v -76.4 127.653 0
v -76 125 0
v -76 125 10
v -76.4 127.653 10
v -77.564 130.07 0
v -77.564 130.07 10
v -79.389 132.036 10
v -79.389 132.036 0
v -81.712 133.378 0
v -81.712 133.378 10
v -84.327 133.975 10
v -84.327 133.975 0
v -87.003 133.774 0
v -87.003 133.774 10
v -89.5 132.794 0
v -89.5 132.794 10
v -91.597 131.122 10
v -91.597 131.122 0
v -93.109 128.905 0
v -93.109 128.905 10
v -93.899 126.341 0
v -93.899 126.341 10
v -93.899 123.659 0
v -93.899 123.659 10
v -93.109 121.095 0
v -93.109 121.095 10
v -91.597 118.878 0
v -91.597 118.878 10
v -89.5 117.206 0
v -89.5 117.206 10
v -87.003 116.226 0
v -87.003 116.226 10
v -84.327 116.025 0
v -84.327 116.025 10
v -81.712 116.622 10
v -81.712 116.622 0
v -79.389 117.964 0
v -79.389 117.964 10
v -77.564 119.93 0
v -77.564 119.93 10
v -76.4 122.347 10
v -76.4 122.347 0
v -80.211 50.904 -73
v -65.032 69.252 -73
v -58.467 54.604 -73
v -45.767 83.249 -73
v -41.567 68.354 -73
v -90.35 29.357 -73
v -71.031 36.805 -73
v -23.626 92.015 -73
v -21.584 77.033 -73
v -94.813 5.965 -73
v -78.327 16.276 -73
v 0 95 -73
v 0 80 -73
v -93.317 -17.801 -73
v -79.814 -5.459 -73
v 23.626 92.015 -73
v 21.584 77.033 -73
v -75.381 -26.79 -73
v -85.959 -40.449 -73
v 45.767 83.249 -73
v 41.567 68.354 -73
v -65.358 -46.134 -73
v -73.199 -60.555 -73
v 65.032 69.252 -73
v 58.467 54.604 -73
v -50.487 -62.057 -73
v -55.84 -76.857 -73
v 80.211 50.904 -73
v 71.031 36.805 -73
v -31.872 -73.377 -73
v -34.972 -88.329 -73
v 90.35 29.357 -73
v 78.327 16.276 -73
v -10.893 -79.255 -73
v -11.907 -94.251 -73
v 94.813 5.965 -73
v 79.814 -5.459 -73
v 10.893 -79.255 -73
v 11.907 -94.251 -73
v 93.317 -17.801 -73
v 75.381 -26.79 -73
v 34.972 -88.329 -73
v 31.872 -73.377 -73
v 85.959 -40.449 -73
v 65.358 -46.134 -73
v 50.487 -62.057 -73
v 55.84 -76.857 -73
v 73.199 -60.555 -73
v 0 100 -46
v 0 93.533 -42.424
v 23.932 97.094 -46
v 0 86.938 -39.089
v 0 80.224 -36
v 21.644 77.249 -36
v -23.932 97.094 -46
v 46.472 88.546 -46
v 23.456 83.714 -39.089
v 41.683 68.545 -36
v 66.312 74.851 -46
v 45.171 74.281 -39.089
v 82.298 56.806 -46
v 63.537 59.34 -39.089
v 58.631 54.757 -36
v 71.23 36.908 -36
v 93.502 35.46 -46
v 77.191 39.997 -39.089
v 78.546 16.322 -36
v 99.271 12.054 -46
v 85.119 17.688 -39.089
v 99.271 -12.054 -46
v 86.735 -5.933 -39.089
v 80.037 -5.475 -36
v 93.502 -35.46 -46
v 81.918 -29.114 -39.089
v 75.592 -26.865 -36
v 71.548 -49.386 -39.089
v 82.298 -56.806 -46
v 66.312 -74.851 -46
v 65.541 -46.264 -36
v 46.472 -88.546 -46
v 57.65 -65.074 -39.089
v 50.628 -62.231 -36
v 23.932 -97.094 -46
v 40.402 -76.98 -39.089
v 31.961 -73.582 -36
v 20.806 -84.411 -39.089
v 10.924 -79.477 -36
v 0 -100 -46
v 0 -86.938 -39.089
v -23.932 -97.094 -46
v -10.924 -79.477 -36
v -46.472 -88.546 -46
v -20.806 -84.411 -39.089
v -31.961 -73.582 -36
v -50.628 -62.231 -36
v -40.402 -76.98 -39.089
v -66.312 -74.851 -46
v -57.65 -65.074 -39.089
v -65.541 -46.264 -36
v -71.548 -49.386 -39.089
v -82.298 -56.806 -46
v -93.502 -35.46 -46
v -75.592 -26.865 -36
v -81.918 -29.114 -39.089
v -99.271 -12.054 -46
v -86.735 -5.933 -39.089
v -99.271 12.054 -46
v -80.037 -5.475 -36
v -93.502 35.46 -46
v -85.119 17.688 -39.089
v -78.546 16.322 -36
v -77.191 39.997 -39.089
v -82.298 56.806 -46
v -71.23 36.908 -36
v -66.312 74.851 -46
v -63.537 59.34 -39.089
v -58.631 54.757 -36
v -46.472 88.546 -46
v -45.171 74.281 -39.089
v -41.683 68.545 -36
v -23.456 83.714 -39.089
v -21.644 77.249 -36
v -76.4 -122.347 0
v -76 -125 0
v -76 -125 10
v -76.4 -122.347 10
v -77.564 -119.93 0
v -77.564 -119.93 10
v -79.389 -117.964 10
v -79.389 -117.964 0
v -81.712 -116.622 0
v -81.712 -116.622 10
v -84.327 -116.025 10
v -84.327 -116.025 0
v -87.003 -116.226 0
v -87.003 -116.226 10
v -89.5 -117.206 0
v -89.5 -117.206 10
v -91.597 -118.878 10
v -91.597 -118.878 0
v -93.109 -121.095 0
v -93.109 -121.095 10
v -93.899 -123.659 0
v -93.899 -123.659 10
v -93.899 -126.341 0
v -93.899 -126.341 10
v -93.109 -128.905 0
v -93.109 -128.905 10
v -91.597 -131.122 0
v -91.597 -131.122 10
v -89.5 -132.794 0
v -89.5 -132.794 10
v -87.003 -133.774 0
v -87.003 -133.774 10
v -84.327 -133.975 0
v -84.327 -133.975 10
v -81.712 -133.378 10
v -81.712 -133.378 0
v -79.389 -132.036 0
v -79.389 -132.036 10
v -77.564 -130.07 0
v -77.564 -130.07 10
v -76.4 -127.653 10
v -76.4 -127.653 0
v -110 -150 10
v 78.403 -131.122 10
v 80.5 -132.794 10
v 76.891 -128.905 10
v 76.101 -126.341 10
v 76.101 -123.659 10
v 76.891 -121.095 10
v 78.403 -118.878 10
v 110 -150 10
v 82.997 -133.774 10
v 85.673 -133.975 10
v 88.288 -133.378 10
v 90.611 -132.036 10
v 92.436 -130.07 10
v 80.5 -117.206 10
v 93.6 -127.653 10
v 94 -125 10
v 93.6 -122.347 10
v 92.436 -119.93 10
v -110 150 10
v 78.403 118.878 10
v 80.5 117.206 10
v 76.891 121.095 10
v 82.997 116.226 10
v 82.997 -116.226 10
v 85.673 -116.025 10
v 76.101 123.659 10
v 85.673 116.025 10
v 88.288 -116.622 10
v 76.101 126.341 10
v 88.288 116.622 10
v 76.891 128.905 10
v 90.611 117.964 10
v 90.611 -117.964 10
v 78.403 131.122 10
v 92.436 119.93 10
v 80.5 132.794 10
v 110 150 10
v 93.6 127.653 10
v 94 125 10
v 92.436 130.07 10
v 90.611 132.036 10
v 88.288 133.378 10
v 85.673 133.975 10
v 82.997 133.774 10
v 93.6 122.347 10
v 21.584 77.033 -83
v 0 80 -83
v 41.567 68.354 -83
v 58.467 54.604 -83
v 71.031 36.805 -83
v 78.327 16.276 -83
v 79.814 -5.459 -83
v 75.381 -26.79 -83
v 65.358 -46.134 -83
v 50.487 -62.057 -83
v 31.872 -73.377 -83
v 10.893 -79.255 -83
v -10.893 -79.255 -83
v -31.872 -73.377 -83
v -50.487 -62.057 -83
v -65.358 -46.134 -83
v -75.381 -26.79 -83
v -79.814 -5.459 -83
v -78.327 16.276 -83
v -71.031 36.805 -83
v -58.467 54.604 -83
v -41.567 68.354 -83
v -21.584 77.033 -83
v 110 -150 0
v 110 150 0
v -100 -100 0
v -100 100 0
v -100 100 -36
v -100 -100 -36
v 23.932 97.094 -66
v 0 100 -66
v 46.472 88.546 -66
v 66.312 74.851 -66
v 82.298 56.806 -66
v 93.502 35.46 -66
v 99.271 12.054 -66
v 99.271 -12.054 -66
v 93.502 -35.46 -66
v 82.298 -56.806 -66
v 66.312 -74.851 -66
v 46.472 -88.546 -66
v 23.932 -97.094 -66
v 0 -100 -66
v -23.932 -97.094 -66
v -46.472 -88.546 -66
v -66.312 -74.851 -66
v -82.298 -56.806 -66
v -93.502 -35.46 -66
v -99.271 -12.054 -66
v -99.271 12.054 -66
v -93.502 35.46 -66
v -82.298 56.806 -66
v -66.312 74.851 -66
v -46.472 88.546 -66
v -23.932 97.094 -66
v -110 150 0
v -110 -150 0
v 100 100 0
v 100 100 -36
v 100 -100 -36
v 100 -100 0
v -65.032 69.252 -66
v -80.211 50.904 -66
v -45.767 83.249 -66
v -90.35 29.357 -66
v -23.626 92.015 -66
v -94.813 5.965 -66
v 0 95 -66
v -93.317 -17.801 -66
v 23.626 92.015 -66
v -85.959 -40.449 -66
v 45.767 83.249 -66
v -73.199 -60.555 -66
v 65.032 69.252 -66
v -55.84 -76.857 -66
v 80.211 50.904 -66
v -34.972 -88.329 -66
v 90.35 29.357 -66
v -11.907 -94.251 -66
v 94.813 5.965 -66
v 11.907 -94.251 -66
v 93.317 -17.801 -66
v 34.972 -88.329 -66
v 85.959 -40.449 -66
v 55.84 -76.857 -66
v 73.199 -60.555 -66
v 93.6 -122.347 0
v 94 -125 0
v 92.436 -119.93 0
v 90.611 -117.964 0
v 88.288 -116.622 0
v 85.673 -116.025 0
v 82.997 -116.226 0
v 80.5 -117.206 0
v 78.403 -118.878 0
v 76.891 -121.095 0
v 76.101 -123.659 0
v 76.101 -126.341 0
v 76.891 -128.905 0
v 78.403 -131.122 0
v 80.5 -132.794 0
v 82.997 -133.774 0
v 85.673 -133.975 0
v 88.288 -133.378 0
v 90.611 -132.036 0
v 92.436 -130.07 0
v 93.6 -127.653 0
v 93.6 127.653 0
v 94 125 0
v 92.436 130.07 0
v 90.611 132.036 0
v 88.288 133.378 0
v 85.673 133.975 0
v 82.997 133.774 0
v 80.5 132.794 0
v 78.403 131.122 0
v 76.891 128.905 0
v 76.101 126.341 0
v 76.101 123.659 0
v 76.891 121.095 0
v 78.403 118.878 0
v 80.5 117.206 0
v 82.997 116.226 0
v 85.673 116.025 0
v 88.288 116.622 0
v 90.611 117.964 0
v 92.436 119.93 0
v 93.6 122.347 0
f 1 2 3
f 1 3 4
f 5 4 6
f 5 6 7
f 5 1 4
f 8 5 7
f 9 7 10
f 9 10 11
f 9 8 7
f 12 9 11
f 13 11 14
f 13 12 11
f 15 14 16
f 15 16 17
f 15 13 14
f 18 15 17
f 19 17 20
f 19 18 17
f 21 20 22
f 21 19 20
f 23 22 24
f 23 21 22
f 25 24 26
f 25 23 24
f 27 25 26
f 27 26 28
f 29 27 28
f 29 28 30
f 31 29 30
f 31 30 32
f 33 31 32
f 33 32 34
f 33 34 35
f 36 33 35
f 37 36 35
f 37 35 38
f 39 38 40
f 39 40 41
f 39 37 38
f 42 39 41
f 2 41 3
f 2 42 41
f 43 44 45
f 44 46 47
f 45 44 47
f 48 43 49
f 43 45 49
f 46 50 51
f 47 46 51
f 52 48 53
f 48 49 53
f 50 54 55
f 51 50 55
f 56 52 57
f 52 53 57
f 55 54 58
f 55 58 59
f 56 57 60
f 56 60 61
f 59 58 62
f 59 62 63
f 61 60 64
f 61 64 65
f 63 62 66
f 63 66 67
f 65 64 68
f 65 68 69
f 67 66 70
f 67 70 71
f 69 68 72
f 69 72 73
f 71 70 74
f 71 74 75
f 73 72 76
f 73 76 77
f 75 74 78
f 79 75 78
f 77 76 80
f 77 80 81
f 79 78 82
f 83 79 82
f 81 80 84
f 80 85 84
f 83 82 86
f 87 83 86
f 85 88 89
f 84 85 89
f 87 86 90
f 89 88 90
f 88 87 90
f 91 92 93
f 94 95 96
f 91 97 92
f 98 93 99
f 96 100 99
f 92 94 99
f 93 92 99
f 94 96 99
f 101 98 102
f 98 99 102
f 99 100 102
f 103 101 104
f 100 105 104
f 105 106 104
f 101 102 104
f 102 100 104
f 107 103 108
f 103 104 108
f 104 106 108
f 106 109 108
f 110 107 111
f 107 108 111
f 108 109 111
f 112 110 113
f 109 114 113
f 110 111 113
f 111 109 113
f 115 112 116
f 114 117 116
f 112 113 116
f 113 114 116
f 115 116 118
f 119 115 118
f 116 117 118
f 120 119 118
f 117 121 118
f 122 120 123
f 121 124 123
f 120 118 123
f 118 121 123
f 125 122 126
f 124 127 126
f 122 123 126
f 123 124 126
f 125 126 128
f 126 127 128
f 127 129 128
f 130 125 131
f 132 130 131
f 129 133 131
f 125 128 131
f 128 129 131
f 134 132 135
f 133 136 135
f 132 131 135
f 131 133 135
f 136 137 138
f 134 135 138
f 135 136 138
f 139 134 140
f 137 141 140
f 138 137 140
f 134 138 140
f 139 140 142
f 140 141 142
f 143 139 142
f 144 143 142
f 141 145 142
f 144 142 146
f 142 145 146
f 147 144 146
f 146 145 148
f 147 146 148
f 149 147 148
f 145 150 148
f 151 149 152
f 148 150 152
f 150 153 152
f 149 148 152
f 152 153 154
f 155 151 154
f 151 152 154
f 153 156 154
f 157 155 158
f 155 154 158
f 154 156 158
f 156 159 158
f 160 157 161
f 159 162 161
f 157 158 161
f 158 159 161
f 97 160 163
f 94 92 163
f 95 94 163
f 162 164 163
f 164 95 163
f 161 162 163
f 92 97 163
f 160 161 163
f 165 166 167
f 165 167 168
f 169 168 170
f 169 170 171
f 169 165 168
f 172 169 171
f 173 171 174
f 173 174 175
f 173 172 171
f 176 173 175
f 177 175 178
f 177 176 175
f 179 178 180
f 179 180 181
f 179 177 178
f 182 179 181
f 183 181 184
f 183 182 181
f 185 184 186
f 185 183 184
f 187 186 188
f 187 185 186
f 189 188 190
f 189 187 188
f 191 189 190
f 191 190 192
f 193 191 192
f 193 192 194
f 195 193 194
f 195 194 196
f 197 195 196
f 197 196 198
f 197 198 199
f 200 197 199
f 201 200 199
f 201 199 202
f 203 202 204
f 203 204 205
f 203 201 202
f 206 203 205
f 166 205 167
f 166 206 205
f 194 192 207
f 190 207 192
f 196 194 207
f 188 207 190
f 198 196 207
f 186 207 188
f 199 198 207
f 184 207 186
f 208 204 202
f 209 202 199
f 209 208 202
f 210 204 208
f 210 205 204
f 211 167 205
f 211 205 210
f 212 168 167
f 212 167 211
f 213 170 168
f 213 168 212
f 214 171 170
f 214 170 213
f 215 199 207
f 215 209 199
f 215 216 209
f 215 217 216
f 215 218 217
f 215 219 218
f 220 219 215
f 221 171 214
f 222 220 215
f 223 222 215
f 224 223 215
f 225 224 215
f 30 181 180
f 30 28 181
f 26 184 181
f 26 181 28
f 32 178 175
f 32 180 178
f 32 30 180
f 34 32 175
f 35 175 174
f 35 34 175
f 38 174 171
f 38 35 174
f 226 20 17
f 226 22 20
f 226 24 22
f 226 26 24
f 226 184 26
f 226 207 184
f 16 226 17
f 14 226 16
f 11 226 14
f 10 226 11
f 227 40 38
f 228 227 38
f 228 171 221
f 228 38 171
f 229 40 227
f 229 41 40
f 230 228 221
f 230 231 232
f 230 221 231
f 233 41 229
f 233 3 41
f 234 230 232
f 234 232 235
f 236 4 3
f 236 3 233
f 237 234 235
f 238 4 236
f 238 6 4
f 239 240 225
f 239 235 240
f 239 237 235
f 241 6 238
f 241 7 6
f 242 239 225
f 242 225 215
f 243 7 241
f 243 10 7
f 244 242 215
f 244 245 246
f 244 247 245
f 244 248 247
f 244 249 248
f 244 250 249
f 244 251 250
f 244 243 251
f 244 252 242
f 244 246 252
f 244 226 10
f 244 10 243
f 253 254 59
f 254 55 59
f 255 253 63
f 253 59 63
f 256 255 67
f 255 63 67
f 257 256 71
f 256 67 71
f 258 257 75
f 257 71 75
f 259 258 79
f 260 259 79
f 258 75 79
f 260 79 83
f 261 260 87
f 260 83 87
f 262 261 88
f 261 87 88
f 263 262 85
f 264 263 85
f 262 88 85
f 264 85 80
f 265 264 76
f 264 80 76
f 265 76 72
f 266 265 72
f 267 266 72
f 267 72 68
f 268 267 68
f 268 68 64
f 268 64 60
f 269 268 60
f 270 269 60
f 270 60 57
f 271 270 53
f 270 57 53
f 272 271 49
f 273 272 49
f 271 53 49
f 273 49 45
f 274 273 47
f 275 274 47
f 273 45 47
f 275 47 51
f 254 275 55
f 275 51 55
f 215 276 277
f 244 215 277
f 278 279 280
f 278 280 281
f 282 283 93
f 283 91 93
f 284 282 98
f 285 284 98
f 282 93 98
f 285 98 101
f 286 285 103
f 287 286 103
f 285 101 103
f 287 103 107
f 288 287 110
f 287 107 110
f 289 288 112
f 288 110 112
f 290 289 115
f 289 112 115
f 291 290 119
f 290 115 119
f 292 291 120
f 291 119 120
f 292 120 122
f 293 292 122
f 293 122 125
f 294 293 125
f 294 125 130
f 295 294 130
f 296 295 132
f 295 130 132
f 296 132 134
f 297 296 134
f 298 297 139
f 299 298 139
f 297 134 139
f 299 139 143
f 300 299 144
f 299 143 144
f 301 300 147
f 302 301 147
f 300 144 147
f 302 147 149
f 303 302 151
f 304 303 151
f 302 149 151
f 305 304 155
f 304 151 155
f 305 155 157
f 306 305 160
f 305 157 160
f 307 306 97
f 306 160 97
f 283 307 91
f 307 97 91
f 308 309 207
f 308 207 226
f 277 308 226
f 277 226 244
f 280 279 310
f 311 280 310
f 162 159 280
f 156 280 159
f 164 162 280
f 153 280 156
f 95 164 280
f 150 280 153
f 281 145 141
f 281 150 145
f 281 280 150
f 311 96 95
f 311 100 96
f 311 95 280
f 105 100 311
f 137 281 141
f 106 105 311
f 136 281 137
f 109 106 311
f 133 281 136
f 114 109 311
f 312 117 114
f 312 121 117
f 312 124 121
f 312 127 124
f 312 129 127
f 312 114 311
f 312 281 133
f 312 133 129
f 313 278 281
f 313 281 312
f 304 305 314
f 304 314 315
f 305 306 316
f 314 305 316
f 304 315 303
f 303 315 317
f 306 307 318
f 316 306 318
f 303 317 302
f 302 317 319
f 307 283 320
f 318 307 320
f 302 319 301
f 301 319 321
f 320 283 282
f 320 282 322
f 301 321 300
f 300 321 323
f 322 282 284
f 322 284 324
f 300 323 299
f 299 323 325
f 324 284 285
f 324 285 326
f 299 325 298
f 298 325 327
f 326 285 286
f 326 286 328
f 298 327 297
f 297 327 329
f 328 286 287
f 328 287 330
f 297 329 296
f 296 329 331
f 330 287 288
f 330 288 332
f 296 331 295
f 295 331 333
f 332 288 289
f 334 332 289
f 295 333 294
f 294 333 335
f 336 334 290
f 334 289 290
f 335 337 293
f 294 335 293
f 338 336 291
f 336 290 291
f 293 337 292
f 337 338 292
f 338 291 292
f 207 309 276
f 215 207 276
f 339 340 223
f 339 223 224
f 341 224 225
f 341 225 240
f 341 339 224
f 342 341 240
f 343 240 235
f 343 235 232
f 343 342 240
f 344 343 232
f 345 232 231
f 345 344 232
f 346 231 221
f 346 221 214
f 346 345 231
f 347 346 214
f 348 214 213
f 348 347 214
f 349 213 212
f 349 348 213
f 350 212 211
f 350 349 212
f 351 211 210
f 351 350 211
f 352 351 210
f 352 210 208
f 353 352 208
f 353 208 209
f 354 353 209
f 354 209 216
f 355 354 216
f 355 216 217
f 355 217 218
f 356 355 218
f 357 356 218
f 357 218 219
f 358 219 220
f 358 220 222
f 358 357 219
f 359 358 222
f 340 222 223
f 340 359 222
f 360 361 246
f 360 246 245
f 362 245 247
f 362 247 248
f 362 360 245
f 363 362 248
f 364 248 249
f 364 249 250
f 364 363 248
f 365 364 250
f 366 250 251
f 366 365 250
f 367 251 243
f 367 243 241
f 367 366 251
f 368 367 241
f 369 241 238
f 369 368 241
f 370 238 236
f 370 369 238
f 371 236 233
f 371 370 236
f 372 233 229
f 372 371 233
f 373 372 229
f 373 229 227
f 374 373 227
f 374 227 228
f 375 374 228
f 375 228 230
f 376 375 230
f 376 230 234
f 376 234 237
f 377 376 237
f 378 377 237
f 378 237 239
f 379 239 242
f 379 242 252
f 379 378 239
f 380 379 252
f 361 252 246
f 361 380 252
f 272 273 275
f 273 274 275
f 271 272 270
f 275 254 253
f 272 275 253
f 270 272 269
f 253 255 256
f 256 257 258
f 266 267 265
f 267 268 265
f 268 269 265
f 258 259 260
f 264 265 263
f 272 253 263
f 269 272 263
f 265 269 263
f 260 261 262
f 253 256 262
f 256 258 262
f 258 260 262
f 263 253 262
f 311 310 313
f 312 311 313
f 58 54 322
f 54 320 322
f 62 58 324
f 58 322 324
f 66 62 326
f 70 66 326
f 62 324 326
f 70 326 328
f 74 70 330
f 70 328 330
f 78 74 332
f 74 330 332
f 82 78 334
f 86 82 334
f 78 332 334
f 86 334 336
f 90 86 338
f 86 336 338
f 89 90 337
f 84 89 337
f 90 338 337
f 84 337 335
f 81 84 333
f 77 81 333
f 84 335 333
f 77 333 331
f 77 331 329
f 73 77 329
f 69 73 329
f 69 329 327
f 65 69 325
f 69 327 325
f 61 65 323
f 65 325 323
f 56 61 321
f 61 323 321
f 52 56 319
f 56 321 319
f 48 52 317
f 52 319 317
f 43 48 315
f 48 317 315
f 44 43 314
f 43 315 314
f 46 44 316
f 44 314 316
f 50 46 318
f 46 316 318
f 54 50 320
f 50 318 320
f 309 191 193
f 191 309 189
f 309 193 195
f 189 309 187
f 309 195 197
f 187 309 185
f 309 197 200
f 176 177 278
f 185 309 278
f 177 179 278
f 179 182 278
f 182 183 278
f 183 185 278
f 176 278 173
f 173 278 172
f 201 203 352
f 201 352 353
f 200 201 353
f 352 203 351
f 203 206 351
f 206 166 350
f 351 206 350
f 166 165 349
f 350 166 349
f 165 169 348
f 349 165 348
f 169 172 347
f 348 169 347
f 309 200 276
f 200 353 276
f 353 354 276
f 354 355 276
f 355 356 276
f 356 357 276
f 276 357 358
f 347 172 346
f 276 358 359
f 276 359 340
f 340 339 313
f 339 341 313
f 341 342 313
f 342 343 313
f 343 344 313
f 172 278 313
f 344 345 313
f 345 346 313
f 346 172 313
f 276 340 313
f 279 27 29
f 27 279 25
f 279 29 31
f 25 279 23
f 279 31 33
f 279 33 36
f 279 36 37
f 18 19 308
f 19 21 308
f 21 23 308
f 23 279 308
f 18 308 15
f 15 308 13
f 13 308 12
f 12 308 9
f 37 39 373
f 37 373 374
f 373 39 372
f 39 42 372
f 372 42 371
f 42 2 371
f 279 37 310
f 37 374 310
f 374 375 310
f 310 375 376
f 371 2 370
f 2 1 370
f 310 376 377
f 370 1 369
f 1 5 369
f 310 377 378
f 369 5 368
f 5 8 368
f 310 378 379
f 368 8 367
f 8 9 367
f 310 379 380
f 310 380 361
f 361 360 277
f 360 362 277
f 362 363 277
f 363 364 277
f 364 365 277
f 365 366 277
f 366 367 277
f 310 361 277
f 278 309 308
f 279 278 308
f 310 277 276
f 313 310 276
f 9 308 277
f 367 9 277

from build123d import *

# Parameters (mm, degrees)
F0_W     = 220
F0_H     = 300
F0_R     = 9
F1_DEPTH = 10
F2_W     = 200
F2_H     = 200
F3_DEPTH = 36


with BuildPart() as f1:
    # F0 (on Top) → F1 (new body)
    with BuildSketch(Plane.XY):
        Rectangle(F0_W, F0_H)
        with Locations((-85, -125)):
            Circle(F0_R, mode=Mode.SUBTRACT)
        with Locations((85, -125)):
            Circle(F0_R, mode=Mode.SUBTRACT)
        with Locations((-85, 125)):
            Circle(F0_R, mode=Mode.SUBTRACT)
        with Locations((85, 125)):
            Circle(F0_R, mode=Mode.SUBTRACT)
    extrude(amount=F1_DEPTH)

    # F2 (on face) → F3 (join)
    with BuildSketch(Plane(origin=(0, 0, 0), x_dir=(1, 0, 0), z_dir=(0, 0, -1))):
        Rectangle(F2_W, F2_H)
    extrude(amount=F3_DEPTH)

    # F4 (on Right) → F5 (revolve)
    with BuildSketch(Plane.YZ):
        with BuildLine():
            Line((100, -66), (100, -46))
            ThreePointArc((100, -46), (90.250635, -40.725886), (80.224051, -36))
            Line((80.224051, -36), (0, -36))
            Line((0, -36), (0, -83))
            Line((0, -83), (80, -83))
            Line((80, -83), (80, -73))
            Line((80, -73), (95, -73))
            Line((95, -73), (95, -66))
            Line((95, -66), (100, -66))
        make_face()
    revolve(axis=Axis((0, 0, -41.5), (0, 0, -1)))


solid = f1.part
